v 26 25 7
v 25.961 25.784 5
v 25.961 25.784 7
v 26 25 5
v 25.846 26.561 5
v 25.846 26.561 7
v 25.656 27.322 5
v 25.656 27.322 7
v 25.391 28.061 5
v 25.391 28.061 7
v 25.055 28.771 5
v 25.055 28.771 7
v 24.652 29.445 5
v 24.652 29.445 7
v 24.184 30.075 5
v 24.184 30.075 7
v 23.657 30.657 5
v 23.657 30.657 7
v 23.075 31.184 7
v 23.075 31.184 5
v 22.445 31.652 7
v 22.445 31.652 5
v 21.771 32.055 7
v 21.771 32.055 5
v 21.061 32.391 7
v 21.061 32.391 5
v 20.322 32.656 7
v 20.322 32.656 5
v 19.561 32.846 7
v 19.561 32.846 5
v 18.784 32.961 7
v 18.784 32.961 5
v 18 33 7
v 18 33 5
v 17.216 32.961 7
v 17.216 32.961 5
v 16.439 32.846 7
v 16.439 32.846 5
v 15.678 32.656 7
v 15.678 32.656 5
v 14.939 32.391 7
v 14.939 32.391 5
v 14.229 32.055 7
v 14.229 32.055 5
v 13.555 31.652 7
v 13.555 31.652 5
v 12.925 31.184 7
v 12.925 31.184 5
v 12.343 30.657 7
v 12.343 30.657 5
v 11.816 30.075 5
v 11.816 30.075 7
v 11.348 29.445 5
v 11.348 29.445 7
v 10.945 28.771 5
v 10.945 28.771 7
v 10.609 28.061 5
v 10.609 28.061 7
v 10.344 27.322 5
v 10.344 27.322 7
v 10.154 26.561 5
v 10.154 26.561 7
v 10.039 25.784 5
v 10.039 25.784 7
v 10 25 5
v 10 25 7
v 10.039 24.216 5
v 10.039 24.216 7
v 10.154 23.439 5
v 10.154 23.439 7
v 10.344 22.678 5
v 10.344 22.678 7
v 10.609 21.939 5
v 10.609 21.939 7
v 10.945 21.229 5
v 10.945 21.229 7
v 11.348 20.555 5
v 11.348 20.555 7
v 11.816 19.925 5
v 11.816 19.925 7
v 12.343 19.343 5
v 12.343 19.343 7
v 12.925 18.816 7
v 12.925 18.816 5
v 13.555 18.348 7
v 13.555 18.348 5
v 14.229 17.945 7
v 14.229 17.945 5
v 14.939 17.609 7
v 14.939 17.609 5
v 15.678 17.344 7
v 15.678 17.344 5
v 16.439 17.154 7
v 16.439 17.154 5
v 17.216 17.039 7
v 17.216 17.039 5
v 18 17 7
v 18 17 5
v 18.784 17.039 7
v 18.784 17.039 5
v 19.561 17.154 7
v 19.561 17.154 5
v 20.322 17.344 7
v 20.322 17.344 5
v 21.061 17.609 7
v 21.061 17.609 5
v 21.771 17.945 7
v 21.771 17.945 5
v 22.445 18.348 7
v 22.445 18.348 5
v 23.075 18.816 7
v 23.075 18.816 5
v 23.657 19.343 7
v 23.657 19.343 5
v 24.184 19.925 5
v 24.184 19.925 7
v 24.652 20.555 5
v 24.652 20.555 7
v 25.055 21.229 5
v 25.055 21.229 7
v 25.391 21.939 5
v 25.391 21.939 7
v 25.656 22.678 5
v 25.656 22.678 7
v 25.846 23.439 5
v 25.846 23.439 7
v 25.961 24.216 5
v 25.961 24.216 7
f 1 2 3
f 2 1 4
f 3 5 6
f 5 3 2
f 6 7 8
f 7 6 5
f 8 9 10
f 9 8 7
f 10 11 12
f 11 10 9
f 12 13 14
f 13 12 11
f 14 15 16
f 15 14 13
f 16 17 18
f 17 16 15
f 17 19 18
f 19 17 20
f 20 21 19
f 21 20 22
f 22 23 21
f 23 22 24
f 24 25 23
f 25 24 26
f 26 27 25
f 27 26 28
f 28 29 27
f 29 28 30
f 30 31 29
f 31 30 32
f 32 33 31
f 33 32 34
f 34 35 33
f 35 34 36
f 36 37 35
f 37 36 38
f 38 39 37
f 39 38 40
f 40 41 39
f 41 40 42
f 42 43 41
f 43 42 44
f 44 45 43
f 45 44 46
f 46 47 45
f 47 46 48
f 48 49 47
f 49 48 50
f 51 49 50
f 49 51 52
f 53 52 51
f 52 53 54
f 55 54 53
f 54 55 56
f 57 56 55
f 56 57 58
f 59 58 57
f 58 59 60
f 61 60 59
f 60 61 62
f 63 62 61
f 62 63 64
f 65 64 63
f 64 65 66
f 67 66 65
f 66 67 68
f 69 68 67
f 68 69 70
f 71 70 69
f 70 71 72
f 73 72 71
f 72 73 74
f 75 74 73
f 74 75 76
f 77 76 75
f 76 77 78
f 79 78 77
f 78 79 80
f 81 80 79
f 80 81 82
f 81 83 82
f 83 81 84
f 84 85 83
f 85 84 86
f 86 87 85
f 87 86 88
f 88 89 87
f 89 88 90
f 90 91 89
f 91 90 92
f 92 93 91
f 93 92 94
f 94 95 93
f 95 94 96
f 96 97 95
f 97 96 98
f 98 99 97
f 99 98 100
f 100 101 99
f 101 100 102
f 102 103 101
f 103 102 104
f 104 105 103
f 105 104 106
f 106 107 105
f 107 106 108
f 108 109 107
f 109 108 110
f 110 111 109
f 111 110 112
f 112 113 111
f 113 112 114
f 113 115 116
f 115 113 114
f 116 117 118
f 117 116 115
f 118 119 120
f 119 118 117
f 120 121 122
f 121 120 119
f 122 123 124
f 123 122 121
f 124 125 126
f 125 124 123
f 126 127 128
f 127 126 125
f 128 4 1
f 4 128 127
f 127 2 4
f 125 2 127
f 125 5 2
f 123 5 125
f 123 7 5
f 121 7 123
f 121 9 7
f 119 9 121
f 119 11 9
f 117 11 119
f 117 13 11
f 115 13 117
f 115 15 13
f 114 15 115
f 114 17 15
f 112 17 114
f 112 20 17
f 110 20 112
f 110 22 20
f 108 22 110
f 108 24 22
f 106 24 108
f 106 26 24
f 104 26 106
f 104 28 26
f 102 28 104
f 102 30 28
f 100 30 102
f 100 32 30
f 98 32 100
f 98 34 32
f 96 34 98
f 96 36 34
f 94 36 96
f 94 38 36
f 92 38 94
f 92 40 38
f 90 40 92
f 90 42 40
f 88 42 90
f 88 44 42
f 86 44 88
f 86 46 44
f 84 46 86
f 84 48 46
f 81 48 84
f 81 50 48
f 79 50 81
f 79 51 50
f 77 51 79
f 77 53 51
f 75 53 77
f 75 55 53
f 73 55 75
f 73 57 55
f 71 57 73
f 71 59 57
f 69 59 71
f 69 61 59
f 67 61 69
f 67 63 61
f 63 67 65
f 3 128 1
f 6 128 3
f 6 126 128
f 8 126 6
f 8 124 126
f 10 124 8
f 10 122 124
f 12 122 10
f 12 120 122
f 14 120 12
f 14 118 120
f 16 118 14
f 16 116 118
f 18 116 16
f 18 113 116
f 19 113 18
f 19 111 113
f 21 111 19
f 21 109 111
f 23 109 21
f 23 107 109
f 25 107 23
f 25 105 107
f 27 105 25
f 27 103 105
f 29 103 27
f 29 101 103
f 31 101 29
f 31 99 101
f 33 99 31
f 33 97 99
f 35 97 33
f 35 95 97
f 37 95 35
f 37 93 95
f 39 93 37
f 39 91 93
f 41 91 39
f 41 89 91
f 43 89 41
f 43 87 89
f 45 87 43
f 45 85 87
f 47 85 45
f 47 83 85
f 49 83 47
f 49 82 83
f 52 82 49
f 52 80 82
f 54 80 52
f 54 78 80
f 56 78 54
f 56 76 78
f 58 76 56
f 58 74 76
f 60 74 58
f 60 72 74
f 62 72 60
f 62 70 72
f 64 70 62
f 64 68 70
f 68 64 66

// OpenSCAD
// badge.scad
// Small raised accent badge/icon for a multi-part classroom sign example
// (assembly part 3 of 3). Hand-authored for the ai-3d-factory examples/
// library (examples/multipart-classroom-sign/). Shares the same origin as
// base.scad/text_layer.scad - do not re-center this part. Intended as its
// own separately-colored accent (e.g. a school-color badge), distinct
// from the base plate and text layer - a simple stand-in for the kind of
// icon/badge part a richer classroom or manufacturing demo might need.
// See docs/slicer-review-workflow.md.
//
// This repo does not run OpenSCAD automatically. Geometry sanity check
// passed does not mean print-ready - human slicer review is still
// required. See AGENT.md.

// ---- Shared parameters (all in millimeters) - keep in sync with base.scad and text_layer.scad ----
plate_width = 150;
plate_depth = 50;
plate_height = 5;

// ---- Badge-only parameters ----
badge_margin = 10;        // distance from the left edge, centered vertically
badge_diameter = 16;
badge_height = 2;         // how far the raised badge rises above the plate surface

module accent_badge() {
    translate([badge_margin + badge_diameter / 2, plate_depth / 2, plate_height])
        cylinder(d = badge_diameter, h = badge_height, $fn = 64);
}

accent_badge();
